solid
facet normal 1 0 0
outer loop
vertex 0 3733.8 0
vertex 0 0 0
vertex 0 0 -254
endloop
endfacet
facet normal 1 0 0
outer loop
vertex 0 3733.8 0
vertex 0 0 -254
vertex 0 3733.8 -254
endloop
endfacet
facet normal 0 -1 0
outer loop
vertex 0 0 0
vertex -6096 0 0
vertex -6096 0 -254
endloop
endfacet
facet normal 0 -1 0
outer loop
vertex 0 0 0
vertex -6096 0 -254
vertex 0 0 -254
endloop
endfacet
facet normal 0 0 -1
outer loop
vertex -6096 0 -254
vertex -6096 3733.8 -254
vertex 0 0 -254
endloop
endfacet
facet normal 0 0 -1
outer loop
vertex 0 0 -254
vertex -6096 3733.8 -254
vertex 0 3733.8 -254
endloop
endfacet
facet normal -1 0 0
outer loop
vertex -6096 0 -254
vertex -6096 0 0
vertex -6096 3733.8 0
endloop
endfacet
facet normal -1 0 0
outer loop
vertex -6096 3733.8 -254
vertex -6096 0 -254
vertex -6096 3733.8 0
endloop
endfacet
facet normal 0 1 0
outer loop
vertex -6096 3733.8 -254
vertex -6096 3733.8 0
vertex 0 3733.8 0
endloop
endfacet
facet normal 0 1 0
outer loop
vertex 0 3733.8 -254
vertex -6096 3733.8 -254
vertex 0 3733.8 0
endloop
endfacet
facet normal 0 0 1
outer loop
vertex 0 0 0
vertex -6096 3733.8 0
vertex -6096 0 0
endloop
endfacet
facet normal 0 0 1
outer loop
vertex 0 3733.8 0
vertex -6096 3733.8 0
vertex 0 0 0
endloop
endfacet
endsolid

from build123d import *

# Parameters (mm, degrees)
F0_W     = 6096
F0_H     = 3733.8
F1_DEPTH = 254


with BuildPart() as f1:
    # F0 (on Top) → F1 (new body)
    with BuildSketch(Plane.XY):
        with Locations((-3048, 1866.9)):
            Rectangle(F0_W, F0_H)
    extrude(amount=-F1_DEPTH)


with BuildPart() as f2_1:
    # F2: copy of F1
    add(f1.part)


solid = f1.part
